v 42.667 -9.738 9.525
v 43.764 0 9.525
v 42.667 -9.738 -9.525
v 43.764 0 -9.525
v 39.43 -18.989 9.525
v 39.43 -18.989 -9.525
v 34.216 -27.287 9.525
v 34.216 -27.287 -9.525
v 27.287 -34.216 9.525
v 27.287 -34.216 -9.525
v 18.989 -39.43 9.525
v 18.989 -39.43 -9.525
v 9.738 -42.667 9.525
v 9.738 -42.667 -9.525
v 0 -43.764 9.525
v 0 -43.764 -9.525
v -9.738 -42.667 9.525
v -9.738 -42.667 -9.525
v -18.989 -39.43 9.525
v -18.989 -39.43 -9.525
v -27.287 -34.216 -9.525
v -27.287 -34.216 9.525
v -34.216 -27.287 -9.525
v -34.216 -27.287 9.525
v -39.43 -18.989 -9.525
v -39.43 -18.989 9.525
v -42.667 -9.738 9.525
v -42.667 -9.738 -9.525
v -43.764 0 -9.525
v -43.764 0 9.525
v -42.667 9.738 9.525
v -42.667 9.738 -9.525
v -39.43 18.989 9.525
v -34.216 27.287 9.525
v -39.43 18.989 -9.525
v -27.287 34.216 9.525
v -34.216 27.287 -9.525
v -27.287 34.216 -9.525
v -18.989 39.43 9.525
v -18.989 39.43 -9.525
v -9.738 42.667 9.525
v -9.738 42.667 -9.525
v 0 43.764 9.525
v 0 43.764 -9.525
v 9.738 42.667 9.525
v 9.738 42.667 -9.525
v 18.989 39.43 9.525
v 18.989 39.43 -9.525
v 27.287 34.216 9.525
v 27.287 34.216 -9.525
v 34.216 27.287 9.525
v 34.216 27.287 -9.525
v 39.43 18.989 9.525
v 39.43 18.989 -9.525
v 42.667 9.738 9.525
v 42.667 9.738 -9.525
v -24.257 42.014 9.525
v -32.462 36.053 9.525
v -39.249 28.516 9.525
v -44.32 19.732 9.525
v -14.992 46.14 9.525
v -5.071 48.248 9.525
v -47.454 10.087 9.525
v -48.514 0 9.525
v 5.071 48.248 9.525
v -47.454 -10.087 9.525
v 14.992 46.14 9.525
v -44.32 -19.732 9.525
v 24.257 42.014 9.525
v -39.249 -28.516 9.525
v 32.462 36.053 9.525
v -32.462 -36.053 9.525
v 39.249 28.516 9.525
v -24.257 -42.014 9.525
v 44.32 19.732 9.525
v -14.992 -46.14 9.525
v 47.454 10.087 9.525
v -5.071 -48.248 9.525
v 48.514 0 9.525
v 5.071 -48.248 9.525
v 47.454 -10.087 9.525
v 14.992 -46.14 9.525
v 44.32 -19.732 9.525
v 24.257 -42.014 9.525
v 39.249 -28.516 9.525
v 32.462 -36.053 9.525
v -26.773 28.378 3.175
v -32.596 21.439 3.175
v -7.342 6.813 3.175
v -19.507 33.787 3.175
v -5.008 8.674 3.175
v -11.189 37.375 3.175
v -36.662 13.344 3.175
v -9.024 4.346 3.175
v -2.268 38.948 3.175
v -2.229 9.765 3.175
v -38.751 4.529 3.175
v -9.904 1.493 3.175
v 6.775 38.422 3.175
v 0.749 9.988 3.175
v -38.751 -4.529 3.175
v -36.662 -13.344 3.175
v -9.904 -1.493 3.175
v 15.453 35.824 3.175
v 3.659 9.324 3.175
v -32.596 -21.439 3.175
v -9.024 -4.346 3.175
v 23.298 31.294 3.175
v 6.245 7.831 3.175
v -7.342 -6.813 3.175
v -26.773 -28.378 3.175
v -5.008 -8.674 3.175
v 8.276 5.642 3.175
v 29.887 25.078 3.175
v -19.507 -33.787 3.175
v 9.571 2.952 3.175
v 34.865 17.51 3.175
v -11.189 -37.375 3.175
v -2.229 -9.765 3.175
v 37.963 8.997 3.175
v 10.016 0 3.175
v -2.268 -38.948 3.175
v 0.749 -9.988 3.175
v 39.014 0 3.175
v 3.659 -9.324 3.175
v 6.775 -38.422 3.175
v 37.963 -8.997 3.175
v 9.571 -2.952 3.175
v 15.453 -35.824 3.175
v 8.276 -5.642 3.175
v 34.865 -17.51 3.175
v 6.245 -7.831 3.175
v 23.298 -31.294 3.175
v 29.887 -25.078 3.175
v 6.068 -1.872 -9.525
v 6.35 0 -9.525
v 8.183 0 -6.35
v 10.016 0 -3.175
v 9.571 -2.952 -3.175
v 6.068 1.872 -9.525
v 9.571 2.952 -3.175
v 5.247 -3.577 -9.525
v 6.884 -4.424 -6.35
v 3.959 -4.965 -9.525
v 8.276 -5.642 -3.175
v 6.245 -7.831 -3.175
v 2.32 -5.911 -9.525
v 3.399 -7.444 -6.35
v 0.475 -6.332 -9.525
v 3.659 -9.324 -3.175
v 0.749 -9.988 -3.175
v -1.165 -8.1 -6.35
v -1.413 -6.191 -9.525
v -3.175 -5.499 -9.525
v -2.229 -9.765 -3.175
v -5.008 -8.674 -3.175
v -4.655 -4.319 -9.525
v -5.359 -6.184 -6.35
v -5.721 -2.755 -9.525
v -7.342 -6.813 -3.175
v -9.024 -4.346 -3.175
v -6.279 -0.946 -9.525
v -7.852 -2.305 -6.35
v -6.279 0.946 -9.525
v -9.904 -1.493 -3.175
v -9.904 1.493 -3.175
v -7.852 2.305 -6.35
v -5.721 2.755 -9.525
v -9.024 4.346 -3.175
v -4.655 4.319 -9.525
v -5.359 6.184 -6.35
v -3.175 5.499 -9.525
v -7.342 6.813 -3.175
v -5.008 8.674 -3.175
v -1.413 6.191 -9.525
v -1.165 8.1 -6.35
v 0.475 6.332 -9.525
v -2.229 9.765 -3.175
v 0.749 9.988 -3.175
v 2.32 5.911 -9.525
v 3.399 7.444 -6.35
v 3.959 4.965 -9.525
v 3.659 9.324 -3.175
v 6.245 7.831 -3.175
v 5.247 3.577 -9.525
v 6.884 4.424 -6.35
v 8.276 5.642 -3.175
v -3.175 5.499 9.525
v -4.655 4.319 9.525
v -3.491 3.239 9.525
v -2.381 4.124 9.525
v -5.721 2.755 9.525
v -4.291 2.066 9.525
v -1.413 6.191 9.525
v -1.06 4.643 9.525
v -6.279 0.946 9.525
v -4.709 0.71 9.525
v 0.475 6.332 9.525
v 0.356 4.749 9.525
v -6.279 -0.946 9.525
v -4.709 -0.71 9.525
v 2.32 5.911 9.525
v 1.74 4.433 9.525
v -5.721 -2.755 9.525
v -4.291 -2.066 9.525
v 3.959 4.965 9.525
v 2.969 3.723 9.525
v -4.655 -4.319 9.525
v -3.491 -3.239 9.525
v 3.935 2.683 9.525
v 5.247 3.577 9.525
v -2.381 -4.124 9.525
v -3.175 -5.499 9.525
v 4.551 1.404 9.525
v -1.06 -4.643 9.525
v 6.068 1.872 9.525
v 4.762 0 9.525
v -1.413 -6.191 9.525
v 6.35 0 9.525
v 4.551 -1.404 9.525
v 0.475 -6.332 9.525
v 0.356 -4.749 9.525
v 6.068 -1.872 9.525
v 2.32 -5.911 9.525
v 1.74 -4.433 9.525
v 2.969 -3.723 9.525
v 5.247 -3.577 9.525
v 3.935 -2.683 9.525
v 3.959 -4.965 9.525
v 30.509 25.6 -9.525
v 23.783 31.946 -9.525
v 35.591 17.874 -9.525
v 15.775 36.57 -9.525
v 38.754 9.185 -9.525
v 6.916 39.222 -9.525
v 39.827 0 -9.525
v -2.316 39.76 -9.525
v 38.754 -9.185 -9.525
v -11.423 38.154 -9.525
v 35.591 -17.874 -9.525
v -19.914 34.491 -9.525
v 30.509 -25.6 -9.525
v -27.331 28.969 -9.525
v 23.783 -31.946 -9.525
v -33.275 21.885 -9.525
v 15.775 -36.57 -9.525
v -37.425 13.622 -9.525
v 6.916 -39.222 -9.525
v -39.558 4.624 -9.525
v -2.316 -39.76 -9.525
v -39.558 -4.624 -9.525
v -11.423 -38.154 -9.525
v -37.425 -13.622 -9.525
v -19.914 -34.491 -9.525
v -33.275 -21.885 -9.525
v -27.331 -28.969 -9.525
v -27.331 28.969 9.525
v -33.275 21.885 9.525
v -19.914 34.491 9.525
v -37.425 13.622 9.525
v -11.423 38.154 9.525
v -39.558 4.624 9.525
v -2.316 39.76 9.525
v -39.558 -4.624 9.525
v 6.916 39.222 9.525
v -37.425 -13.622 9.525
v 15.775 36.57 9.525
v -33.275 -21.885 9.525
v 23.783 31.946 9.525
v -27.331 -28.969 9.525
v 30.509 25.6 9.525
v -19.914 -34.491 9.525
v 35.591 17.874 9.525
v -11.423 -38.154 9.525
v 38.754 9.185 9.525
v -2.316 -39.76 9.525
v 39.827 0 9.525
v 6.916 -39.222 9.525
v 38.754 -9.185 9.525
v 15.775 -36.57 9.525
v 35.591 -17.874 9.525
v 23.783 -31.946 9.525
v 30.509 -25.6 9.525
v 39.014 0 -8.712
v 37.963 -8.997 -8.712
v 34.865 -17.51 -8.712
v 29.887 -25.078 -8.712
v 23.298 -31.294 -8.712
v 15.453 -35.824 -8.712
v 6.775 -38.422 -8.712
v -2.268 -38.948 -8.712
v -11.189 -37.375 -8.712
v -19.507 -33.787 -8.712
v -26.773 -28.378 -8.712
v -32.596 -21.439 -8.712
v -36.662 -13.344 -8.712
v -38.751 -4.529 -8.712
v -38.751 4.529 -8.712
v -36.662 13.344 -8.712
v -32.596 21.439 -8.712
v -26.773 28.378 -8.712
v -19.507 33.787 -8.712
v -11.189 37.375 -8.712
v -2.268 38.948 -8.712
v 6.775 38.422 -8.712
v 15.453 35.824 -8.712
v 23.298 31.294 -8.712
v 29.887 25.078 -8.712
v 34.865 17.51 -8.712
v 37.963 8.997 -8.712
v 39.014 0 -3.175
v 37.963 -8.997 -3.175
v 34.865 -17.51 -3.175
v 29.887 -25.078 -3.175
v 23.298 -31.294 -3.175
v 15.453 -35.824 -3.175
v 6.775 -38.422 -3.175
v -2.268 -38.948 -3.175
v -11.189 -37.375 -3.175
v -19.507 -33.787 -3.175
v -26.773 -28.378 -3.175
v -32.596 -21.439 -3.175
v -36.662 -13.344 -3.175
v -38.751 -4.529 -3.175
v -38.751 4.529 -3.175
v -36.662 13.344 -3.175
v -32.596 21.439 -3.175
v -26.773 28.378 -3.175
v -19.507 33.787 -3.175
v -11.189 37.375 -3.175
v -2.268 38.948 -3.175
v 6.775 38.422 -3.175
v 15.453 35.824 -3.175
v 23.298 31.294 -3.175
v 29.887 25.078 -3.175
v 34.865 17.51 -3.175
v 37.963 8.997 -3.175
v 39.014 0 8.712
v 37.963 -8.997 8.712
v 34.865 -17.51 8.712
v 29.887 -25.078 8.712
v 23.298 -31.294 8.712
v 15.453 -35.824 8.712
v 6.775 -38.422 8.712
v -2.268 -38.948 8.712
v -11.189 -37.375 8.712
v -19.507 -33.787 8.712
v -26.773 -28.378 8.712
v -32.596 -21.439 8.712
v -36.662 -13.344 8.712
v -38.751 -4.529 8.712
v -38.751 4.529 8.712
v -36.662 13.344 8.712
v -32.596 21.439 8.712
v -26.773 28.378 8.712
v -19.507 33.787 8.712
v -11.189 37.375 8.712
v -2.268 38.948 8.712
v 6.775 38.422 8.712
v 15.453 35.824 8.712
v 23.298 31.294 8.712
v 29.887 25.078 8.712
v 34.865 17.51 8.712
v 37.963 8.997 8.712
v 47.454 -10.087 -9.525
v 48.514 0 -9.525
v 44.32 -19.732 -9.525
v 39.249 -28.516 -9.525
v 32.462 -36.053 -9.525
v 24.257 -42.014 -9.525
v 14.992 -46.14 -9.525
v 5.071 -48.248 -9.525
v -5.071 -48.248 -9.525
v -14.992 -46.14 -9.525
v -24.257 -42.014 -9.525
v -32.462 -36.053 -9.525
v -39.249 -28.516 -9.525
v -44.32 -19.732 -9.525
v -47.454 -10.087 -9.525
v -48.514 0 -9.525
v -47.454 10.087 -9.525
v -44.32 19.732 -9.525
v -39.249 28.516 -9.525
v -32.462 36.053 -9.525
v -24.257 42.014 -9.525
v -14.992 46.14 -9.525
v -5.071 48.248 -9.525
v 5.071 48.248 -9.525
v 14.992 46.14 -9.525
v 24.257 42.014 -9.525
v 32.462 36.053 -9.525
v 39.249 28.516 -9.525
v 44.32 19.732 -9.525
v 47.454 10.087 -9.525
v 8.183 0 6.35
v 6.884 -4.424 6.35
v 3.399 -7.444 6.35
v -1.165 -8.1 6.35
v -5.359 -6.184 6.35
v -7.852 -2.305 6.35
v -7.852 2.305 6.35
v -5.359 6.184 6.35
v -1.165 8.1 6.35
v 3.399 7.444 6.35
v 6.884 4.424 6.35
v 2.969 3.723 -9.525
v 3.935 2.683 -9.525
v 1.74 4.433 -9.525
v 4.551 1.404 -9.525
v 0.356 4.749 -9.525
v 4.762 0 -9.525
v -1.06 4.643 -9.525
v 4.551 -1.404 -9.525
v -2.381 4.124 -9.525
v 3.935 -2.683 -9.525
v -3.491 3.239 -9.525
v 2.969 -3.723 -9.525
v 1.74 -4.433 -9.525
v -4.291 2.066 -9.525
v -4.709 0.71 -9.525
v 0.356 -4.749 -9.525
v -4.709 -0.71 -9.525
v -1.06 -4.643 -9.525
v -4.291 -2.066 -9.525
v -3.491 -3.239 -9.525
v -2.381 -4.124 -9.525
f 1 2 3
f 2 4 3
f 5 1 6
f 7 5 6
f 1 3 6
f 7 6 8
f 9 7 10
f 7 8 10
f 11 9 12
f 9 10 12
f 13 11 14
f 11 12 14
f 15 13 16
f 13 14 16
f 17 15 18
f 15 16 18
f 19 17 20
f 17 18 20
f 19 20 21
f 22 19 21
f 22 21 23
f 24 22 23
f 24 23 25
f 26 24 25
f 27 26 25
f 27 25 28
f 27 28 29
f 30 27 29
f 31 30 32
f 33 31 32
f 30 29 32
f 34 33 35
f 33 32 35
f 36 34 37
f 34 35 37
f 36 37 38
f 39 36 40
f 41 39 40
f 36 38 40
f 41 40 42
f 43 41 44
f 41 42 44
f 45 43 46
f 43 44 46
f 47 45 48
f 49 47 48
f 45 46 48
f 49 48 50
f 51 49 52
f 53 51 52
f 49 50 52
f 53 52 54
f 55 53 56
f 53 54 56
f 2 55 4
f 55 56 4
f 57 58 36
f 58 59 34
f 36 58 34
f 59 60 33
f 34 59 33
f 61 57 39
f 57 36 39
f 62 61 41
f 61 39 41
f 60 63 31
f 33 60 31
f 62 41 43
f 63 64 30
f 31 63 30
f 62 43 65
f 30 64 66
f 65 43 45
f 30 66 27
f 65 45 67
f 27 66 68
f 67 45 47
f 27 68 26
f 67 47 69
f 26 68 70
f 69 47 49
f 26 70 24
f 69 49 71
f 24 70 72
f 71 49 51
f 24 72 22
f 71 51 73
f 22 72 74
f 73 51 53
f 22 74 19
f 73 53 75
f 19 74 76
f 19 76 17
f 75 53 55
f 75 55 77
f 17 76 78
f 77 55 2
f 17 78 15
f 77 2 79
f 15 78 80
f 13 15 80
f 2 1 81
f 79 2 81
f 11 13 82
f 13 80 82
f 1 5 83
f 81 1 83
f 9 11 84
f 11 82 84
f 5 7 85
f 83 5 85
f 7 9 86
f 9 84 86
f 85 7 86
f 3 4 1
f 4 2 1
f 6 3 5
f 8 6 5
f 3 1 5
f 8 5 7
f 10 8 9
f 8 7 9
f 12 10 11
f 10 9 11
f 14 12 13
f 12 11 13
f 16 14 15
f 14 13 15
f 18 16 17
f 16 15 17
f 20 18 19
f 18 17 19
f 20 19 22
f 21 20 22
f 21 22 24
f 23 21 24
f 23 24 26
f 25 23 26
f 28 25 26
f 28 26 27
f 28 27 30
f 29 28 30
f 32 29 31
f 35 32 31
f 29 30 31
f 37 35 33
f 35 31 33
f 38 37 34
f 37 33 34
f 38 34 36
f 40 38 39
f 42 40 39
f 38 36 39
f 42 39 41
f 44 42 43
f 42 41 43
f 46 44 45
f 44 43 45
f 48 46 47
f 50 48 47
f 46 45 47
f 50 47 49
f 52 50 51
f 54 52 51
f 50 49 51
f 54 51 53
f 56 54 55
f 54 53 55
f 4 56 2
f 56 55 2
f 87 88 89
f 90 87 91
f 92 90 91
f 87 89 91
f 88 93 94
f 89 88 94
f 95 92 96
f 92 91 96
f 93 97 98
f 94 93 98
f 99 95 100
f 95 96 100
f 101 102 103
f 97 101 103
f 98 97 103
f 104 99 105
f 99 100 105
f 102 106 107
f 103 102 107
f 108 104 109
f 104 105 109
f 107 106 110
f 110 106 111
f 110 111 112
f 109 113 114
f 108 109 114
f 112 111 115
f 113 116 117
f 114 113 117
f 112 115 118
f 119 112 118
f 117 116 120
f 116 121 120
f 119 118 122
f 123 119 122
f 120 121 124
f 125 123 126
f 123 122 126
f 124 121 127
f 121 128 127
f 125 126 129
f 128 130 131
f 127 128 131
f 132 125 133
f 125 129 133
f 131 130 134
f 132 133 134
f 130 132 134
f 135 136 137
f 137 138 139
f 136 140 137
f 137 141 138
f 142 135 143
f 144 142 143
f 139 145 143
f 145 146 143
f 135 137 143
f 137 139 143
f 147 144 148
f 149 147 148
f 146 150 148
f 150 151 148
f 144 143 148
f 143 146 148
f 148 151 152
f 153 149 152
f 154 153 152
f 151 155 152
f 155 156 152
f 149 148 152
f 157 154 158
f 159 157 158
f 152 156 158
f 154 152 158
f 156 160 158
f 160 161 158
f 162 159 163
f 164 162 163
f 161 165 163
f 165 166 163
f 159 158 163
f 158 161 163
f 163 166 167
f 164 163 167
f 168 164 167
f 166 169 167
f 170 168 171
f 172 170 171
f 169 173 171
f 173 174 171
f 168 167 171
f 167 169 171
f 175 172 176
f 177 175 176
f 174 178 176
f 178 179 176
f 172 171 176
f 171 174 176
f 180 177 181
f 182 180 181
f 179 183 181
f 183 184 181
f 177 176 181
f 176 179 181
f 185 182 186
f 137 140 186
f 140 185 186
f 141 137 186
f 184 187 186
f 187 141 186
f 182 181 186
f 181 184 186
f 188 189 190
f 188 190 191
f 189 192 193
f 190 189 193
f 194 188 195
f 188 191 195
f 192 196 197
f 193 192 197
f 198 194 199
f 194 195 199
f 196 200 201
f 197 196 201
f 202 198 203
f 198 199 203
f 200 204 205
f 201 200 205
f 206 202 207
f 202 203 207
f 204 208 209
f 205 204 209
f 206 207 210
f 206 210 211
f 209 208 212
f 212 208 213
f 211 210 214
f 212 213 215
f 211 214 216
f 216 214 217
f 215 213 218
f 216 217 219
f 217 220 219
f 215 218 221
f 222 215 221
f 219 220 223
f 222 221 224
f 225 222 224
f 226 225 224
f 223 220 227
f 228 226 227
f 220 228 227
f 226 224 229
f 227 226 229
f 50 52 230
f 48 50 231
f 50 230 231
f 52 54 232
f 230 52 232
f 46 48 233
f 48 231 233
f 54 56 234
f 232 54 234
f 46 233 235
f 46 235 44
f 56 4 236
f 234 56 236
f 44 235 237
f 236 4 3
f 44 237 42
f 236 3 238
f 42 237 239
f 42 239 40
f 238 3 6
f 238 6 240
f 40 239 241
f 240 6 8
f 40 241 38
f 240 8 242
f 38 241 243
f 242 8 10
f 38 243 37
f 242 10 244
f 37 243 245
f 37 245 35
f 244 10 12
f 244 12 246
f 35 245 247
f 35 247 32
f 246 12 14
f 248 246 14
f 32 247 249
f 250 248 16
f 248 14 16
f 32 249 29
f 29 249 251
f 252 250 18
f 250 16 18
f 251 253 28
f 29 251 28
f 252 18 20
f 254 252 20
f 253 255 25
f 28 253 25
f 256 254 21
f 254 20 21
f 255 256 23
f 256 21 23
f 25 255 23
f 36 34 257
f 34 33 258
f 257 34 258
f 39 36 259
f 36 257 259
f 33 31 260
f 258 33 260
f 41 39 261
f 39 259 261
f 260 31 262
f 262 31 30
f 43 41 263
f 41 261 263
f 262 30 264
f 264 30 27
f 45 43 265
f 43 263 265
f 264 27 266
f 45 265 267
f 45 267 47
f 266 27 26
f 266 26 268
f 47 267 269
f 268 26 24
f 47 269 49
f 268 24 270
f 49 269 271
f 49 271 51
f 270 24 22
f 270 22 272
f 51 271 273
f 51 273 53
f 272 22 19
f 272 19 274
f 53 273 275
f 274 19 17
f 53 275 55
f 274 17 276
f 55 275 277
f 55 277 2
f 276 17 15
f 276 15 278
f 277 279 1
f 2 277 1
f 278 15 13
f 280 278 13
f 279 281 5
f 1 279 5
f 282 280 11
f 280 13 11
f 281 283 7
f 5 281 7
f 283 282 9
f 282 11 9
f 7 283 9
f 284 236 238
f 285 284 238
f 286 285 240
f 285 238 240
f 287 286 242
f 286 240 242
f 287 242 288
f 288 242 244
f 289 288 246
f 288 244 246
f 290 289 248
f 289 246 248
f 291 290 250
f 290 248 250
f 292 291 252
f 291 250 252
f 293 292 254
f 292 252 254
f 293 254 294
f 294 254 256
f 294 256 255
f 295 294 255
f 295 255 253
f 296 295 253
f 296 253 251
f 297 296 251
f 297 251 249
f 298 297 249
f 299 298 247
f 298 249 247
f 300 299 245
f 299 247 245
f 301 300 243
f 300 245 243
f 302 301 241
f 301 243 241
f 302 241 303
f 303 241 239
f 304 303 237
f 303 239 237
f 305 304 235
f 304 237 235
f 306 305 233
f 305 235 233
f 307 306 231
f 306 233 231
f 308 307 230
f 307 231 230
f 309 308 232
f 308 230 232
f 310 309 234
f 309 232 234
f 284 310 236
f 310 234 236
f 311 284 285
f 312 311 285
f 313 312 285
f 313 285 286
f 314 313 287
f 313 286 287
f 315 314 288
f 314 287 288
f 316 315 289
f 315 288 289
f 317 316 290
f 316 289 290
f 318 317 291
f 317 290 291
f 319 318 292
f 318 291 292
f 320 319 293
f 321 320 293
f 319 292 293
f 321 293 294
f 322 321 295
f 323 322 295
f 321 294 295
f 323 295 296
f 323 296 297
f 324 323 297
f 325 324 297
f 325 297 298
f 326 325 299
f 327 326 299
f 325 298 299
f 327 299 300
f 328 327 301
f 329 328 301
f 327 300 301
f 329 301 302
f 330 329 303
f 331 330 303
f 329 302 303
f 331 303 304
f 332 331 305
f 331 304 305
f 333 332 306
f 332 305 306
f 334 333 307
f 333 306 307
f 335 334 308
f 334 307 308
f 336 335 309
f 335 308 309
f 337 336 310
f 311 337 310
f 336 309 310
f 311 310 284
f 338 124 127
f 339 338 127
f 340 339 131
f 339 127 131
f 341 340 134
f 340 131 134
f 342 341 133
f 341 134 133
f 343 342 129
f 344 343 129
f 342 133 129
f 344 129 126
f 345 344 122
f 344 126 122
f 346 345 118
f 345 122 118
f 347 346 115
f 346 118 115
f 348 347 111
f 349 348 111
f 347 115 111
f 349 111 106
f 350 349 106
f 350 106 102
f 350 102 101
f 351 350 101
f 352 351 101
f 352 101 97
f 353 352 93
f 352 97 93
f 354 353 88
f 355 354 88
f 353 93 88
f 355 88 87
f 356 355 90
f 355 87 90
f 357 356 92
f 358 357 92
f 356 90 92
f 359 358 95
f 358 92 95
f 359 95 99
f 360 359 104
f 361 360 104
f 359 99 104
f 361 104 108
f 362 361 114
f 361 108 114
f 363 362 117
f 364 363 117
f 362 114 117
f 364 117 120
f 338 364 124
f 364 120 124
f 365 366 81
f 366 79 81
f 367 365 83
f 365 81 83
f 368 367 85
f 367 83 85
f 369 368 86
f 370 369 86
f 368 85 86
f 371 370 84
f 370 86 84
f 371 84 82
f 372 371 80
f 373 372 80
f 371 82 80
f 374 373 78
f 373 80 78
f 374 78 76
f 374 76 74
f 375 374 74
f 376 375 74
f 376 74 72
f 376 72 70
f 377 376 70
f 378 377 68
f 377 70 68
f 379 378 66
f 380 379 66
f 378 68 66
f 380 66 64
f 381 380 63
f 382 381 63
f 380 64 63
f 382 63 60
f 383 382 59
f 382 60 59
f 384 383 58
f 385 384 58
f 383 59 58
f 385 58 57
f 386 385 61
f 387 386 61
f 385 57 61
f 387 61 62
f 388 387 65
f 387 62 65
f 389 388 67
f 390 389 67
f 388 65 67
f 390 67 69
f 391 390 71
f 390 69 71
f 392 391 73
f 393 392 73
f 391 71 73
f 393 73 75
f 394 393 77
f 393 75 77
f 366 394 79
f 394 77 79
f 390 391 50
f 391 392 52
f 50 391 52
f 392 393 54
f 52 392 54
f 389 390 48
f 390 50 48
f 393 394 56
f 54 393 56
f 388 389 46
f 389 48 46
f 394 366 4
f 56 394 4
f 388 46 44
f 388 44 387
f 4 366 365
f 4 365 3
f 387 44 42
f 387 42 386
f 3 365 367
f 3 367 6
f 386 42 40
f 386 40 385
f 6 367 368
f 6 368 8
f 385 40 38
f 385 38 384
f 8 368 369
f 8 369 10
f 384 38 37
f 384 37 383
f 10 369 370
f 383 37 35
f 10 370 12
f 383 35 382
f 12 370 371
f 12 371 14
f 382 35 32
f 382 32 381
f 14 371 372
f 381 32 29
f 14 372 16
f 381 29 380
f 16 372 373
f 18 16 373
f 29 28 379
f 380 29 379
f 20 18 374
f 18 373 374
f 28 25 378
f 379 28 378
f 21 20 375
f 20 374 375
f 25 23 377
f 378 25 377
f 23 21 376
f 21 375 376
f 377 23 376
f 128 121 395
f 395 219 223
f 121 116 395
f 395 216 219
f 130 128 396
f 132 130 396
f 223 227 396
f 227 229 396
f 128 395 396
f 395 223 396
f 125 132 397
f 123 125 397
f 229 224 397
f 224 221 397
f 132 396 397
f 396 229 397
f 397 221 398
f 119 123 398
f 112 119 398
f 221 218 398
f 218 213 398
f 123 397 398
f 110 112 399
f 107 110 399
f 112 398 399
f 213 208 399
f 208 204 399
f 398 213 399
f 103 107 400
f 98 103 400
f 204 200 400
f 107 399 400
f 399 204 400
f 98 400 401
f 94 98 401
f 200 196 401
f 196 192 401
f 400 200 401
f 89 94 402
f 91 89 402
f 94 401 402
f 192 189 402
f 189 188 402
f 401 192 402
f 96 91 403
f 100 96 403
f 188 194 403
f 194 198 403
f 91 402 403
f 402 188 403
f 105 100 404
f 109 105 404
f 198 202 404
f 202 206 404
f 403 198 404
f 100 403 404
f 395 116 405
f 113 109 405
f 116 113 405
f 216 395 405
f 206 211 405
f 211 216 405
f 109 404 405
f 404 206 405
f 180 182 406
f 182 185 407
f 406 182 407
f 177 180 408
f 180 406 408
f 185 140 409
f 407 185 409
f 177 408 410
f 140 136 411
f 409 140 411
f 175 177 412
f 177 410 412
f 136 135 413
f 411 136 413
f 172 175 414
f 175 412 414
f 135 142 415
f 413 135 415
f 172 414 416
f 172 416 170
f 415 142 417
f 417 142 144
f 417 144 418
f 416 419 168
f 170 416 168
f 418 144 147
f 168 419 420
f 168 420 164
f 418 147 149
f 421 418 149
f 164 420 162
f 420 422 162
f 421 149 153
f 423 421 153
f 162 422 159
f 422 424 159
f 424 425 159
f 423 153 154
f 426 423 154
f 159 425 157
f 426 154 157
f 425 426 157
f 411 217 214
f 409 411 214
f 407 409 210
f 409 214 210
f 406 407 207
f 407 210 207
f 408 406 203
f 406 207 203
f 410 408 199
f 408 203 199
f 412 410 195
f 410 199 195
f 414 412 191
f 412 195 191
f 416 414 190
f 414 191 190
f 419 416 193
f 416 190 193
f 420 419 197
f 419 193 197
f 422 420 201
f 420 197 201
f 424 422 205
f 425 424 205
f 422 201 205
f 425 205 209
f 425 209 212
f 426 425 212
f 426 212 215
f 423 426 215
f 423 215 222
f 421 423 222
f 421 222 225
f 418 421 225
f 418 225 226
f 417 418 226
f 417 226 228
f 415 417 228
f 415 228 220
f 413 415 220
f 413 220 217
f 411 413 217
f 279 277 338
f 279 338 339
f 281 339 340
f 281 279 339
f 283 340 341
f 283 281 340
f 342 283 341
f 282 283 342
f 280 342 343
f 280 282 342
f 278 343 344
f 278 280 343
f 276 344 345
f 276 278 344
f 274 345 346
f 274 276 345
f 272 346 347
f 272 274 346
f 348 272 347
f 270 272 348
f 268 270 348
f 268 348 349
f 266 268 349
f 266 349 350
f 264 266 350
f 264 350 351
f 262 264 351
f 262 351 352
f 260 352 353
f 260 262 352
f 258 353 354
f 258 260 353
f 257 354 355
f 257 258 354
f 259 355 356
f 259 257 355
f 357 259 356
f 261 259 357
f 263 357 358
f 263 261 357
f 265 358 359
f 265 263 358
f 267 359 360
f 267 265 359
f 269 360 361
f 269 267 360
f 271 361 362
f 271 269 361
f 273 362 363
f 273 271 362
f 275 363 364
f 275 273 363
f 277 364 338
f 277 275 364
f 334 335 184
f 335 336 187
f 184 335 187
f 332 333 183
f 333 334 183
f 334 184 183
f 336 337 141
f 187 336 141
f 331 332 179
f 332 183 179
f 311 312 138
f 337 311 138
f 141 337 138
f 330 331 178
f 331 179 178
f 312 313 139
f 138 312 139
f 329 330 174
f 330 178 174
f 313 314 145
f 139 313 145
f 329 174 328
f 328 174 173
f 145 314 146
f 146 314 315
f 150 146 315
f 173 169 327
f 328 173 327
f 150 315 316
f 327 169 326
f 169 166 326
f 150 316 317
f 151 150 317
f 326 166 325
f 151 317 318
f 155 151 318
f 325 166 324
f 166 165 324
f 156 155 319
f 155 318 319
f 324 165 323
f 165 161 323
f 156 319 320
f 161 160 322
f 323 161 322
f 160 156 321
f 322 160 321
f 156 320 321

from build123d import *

# Parameters (mm, degrees)
F3_R     = 4.7625
F4_DEPTH = 19.051
F5_SIZE  = 0.8128


with BuildPart() as f1:
    # F0 (on Front) → F1 (revolve)
    with BuildSketch(Plane.XZ):
        Polygon((6.35, 9.525), (0, 9.525), (0, -9.525), (6.35, -9.525), (10.016174, -3.175), (39.0144, -3.175), (39.0144, -9.525), (43.7642, -9.525), (43.7642, 0), (43.7642, 9.525), (39.0144, 9.525), (39.0144, 3.175), (10.016174, 3.175), align=None)
    revolve(axis=Axis((0, 0, 0), (0, 0, -1)))

    # F3 (on face) → F4 (cut, through all)
    with BuildSketch(Plane.XY.offset(9.525)):
        Circle(F3_R)
    extrude(amount=-F4_DEPTH, mode=Mode.SUBTRACT)

    # F5
    f5_edges = [f1.edges().sort_by_distance(p)[0] for p in [
        (-39.0144, 0, 9.525),
        (-39.0144, 0, -9.525),
    ]]
    chamfer(f5_edges, length=F5_SIZE)


with BuildPart() as f2:
    # F0 (on Front) → F2 (revolve)
    with BuildSketch(Plane.XZ):
        Polygon((48.514, 9.525), (43.7642, 9.525), (43.7642, 0), (43.7642, -9.525), (48.514, -9.525), (48.514, 0), align=None)
    revolve(axis=Axis((0, 0, 0), (0, 0, -1)))


solid = Compound([f1.part, f2.part])
